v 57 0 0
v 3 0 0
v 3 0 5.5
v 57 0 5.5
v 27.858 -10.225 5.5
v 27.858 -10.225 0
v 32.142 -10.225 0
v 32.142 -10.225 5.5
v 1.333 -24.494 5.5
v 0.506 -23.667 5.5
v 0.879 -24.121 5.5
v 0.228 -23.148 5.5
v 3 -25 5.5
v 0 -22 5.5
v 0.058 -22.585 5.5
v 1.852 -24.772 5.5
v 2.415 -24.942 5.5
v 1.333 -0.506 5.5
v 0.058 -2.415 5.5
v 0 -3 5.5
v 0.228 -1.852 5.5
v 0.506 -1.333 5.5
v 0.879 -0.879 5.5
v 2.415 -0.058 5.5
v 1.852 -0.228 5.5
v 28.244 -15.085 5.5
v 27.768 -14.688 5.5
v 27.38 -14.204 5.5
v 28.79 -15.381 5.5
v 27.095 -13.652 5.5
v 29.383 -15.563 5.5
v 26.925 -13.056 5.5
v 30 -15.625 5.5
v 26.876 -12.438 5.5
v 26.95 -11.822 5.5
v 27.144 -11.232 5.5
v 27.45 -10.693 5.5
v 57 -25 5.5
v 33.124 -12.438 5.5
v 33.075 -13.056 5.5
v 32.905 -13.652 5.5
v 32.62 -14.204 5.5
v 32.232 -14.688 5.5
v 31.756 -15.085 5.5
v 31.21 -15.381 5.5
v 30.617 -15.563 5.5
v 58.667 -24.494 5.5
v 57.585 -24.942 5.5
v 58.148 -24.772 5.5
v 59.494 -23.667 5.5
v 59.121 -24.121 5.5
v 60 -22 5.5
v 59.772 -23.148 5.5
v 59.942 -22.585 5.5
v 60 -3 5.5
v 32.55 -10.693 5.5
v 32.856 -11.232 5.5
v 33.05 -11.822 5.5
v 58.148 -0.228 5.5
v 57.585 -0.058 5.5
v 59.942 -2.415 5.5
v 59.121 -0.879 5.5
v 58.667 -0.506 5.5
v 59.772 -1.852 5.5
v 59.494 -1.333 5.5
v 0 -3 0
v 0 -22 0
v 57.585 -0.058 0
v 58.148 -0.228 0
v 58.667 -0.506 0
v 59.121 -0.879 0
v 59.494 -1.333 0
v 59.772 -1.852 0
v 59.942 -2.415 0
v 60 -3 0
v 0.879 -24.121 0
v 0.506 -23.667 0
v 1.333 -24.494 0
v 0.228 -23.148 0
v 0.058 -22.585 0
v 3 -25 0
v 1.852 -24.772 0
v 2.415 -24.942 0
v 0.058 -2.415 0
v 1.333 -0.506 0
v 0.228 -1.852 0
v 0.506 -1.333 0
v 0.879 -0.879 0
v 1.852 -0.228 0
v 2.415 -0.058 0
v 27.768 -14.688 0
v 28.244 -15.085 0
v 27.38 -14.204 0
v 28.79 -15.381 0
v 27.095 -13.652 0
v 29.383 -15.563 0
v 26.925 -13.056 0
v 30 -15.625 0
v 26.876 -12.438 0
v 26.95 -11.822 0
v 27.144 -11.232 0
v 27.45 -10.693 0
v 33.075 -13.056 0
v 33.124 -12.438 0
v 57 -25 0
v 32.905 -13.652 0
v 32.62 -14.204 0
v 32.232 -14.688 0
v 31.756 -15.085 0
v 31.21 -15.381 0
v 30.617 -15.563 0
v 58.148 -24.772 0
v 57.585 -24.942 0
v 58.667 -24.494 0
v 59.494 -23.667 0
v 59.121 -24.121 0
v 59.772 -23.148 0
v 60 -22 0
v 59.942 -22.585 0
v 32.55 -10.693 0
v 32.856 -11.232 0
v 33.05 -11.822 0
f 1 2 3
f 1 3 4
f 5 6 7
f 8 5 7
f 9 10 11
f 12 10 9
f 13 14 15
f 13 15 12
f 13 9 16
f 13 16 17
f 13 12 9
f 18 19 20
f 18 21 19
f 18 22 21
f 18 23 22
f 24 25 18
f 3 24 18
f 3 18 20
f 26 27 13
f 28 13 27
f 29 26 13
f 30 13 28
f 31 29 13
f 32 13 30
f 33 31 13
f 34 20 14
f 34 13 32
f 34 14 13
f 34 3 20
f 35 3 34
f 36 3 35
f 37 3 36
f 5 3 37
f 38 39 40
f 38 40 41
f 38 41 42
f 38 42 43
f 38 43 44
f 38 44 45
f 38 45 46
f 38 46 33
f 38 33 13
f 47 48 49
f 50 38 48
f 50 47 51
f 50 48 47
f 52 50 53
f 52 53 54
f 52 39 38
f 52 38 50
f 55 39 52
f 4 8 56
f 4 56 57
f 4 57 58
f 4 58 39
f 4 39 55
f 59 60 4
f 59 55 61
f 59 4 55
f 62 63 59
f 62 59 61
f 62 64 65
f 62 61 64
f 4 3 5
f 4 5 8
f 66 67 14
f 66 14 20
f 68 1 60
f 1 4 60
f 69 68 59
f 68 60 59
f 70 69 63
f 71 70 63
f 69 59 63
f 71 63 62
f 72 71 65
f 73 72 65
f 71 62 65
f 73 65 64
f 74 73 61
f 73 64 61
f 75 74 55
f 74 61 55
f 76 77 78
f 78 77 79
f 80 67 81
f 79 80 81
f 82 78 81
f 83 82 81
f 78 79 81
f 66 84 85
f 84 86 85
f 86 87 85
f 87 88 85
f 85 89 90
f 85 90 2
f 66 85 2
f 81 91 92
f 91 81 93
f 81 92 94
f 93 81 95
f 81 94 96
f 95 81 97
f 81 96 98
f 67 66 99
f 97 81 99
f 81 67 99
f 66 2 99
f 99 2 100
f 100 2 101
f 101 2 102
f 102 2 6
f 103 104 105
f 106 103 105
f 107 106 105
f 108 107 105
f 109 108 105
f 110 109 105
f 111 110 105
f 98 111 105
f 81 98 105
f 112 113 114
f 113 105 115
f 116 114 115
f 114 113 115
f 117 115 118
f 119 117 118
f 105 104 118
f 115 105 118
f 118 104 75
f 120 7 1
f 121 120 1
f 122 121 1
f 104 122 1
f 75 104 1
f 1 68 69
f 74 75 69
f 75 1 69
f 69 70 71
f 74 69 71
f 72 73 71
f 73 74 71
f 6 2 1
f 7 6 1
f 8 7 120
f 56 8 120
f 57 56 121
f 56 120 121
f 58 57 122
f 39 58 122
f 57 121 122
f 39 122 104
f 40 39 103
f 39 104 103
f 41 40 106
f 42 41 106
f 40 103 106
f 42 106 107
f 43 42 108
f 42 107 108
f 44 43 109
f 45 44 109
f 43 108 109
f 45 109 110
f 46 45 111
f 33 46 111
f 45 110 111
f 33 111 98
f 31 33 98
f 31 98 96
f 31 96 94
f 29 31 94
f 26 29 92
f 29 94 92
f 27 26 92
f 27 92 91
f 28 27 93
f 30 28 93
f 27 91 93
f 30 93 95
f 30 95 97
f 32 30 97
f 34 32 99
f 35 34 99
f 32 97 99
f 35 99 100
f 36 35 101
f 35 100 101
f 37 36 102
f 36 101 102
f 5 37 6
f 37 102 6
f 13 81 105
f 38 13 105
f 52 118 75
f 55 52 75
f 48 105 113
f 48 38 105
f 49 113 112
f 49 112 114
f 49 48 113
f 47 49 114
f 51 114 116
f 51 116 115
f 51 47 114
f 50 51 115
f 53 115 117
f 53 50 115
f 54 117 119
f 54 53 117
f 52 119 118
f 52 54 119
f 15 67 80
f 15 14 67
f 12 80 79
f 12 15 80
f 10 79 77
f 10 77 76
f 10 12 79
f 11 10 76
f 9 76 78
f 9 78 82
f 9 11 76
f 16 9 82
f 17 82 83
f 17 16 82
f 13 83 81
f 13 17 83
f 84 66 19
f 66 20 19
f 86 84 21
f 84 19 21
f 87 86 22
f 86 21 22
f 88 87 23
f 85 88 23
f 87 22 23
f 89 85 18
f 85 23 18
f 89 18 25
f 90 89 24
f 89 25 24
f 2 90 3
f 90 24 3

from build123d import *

# Parameters (mm, degrees)
F0_W     = 60
F0_H     = 25
F1_DEPTH = 5.5
F2_R     = 3


with BuildPart() as f1:
    # F0 (on Top) → F1 (new body)
    with BuildSketch(Plane.XY):
        with Locations((30, -12.5)):
            Rectangle(F0_W, F0_H)
        with BuildLine():
            ThreePointArc((32.142429, -10.225), (30, -15.625), (27.857571, -10.225))
            Line((27.857571, -10.225), (32.142429, -10.225))
        make_face(mode=Mode.SUBTRACT)
    extrude(amount=F1_DEPTH)

    # F2
    f2_edges = [f1.edges().sort_by_distance(p)[0] for p in [
        (0, -25, 2.75),
        (60, -25, 2.75),
        (60, 0, 2.75),
        (0, 0, 2.75),
    ]]
    fillet(f2_edges, radius=F2_R)


solid = f1.part
